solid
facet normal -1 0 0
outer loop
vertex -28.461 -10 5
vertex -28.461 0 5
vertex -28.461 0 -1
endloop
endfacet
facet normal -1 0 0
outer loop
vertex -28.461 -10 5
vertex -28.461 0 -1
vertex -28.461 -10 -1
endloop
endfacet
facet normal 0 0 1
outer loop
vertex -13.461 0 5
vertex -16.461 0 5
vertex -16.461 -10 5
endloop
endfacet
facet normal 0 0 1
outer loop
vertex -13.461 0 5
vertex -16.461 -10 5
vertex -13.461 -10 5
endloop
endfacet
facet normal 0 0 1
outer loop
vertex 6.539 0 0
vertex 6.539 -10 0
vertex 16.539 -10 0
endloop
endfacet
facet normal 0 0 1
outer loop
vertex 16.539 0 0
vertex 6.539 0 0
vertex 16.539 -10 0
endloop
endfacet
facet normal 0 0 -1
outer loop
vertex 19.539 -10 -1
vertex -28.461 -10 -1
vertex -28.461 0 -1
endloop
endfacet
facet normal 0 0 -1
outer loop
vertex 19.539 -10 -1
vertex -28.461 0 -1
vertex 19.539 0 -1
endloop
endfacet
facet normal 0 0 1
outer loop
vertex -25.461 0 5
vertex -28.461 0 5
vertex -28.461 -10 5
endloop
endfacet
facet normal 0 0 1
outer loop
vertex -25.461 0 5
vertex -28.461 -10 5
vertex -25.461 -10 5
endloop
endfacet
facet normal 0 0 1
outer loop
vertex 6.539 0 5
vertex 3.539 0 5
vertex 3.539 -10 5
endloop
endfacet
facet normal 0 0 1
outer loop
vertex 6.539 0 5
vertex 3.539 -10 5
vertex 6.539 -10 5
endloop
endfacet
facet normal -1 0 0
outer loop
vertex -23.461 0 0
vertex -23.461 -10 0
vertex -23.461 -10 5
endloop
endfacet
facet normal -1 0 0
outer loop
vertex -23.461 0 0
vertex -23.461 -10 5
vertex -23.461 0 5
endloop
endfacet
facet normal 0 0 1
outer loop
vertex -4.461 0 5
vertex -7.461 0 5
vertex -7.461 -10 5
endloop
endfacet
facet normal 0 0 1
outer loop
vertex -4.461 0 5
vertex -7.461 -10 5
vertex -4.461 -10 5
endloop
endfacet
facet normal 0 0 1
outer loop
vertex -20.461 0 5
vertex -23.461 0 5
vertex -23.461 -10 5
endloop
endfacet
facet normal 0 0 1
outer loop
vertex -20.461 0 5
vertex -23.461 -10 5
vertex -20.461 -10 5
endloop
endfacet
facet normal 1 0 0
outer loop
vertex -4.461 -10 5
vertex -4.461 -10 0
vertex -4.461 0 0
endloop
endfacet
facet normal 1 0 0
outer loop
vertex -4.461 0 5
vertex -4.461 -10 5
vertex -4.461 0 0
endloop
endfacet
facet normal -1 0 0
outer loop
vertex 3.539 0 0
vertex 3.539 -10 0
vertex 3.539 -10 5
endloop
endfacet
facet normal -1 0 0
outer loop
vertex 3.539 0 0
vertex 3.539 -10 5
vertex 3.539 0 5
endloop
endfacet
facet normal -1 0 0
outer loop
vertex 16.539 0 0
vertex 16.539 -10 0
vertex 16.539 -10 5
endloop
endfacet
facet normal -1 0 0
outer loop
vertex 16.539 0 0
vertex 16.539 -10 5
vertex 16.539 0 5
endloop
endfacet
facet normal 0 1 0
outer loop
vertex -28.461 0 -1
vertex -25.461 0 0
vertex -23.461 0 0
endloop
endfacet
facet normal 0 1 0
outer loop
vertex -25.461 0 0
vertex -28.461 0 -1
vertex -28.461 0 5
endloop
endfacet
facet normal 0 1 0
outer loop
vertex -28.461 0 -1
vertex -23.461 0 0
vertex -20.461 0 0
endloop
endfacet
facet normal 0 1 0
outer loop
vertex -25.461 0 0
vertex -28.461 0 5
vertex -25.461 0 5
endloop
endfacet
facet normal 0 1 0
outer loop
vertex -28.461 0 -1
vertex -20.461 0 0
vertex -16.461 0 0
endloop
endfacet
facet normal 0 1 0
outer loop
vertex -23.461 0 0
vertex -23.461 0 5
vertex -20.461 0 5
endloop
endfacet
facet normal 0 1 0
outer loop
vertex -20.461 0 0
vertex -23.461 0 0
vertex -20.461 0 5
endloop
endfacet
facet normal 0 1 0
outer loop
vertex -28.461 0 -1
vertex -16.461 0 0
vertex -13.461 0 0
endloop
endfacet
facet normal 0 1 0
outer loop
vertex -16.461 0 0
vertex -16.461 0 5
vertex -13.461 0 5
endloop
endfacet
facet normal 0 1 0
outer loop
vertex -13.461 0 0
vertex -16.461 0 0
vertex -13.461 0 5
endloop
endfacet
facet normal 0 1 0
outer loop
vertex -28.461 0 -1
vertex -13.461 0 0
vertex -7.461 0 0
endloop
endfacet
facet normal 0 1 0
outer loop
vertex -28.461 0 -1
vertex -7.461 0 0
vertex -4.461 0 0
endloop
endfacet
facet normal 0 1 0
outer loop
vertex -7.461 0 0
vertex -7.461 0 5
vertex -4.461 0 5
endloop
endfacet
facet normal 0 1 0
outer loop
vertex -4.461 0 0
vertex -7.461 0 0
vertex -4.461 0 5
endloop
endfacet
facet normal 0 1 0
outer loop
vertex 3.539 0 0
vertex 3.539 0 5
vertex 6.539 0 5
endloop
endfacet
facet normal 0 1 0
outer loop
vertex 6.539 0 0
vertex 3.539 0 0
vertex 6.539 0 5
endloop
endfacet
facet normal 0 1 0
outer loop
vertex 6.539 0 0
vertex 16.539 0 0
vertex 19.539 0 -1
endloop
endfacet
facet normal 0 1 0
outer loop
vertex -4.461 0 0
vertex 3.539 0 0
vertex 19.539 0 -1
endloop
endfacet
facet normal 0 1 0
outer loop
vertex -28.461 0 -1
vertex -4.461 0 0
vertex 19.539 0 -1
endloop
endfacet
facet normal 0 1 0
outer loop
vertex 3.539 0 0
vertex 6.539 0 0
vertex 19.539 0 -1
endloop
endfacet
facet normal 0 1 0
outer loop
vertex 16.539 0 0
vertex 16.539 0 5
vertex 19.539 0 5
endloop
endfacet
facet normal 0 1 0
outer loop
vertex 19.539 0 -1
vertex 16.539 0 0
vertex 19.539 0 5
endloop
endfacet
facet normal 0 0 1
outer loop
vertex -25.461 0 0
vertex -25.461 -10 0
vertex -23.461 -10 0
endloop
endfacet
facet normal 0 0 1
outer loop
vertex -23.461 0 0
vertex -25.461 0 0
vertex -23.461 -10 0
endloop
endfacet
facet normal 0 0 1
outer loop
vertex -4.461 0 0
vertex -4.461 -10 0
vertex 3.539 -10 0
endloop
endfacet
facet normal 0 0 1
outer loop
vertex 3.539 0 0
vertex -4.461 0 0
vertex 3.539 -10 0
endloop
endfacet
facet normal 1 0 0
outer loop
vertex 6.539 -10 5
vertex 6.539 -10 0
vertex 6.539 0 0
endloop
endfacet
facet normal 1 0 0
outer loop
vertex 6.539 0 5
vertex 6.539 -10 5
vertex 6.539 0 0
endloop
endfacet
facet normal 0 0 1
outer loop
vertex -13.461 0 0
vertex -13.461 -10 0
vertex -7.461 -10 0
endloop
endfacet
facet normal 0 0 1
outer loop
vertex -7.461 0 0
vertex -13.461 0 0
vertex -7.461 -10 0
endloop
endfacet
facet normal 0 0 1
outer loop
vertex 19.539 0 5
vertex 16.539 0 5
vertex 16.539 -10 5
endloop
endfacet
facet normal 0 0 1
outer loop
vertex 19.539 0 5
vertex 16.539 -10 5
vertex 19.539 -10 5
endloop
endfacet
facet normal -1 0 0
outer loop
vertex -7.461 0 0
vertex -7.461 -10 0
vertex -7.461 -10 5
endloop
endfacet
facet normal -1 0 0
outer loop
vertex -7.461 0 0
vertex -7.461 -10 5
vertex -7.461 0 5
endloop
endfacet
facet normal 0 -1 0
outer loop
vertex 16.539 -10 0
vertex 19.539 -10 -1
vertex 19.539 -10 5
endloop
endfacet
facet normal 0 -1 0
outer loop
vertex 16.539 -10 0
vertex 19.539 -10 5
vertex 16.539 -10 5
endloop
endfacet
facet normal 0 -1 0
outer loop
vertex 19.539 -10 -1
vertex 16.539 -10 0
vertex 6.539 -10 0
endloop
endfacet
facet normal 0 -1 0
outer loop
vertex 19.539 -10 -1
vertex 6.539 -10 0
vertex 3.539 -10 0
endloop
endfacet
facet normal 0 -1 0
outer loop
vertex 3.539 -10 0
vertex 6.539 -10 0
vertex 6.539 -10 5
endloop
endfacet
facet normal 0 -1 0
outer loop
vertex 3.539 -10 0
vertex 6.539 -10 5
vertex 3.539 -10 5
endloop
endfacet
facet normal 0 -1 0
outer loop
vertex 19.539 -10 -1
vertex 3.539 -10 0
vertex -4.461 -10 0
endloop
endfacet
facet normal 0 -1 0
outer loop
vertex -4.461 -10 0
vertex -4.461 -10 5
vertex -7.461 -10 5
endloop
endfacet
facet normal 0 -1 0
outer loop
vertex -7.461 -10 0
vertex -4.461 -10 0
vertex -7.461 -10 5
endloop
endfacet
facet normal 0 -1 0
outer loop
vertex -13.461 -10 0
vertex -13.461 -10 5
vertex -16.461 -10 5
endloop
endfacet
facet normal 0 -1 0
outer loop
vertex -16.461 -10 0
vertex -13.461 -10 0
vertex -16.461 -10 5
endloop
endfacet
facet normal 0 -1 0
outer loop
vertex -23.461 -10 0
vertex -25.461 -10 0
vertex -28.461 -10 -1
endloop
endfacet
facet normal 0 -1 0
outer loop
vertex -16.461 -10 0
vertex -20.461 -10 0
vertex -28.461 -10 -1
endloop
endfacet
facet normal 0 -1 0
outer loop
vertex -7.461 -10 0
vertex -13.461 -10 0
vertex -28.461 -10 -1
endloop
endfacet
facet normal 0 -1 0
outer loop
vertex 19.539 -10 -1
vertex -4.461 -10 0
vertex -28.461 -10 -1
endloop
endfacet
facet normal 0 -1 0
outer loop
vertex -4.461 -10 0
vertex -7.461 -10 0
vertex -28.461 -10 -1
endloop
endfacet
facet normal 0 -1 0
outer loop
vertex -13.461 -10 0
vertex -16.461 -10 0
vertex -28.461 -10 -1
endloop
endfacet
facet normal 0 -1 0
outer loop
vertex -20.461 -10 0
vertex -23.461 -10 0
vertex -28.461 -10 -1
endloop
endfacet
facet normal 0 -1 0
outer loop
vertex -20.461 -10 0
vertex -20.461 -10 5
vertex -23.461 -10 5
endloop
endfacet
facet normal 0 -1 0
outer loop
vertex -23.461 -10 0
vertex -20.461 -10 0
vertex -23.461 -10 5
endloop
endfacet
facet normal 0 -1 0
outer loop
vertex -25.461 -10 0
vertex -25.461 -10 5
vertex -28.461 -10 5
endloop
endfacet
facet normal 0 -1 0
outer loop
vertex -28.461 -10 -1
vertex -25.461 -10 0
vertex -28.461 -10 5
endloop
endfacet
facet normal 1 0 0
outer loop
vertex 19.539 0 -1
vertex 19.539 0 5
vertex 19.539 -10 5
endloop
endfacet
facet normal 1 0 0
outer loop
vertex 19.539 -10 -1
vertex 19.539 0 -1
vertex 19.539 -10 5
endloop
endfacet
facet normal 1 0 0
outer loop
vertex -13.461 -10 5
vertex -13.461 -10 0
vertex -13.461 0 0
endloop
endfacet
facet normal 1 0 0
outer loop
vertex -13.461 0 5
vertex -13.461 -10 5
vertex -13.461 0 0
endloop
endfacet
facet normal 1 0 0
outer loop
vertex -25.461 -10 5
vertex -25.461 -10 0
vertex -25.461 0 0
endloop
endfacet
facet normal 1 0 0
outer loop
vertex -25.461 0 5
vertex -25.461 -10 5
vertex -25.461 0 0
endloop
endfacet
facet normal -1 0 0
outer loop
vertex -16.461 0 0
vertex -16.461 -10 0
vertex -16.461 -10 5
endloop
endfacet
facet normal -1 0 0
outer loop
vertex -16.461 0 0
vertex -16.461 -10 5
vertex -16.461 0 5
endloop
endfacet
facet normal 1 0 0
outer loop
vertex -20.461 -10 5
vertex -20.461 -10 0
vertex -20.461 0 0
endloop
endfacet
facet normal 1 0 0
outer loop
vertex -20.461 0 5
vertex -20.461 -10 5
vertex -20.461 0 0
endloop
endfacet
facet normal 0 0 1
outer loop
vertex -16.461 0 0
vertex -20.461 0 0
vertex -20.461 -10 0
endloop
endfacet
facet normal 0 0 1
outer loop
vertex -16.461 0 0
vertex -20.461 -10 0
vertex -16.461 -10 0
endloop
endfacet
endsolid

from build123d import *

# Parameters (mm, degrees)
F0_W     = 3
F0_H     = 10
F1_DEPTH = 5
F2_W     = 45
F2_H     = 10
F2_W_2   = 3
F3_DEPTH = 1


with BuildPart() as f1:
    # F0 (on Top) → F1 (new body)
    with BuildSketch(Plane.XY):
        with Locations((-26.961136, -5)):
            Rectangle(F0_W, F0_H)
        with Locations((-21.961136, -5)):
            Rectangle(F0_W, F0_H)
        with Locations((-14.961136, -5)):
            Rectangle(F0_W, F0_H)
        with Locations((-5.961136, -5)):
            Rectangle(F0_W, F0_H)
        with Locations((5.038864, -5)):
            Rectangle(F0_W, F0_H)
        with Locations((18.038864, -5)):
            Rectangle(F0_W, F0_H)
    extrude(amount=F1_DEPTH)

    # F2 (on face) → F3 (join)
    with BuildSketch(Plane(origin=(0, 0, 0), x_dir=(1, 0, 0), z_dir=(0, 0, -1))):
        with Locations((-2.961136, 5)):
            Rectangle(F2_W, F2_H)
        with Locations((-26.961136, 5)):
            Rectangle(F2_W_2, F2_H)
    extrude(amount=F3_DEPTH)


solid = f1.part
